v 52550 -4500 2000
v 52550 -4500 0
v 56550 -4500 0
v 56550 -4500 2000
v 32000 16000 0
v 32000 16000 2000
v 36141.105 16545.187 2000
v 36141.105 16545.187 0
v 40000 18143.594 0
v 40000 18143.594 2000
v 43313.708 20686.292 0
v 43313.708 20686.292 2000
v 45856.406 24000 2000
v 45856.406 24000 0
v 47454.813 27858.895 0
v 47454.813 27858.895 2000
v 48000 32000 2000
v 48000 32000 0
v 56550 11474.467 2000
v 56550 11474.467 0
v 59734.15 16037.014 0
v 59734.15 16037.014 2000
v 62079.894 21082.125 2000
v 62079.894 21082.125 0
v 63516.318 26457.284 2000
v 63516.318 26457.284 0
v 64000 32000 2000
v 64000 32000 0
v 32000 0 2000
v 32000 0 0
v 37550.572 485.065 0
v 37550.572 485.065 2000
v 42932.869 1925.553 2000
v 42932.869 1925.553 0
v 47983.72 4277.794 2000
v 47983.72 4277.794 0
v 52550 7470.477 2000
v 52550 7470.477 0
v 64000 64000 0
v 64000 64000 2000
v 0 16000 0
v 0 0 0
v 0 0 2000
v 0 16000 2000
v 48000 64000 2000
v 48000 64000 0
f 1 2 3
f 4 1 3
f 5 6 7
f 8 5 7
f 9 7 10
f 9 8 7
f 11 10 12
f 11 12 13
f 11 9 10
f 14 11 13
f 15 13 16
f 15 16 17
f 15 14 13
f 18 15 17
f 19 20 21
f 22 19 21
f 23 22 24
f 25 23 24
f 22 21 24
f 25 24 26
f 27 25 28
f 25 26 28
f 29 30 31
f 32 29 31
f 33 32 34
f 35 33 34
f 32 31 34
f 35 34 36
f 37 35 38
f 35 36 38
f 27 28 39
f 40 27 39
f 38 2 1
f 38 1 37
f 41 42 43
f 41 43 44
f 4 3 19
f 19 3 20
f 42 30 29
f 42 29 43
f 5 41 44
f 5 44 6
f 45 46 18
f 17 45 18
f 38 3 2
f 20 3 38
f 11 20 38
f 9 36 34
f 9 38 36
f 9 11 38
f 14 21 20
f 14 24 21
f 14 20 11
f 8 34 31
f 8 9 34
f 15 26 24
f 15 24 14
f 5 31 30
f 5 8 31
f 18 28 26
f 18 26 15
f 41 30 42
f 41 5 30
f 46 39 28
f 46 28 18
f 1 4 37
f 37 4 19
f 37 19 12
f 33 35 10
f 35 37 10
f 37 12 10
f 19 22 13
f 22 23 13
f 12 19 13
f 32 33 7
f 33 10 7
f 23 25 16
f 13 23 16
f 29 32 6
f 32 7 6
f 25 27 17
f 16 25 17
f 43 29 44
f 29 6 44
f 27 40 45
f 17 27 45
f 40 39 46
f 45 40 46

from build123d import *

# Parameters (mm, degrees)
PAD_DEPTH = 2000


with BuildPart() as part:
    # Sketch → Pad (new body)
    with BuildSketch(Plane.XY):
        with BuildLine():
            Line((0, 16000), (32000, 16000))
            ThreePointArc((32000, 16000), (43313.708499, 20686.291501), (48000, 32000))
            Line((48000, 64000), (48000, 32000))
            Line((64000, 64000), (48000, 64000))
            Line((64000, 32000), (64000, 64000))
            ThreePointArc((56550, 11474.46712), (62079.893617, 21082.124749), (64000, 32000))
            Line((56550, -4500), (56550, 11474.46712))
            Line((52550, -4500), (56550, -4500))
            Line((52550, -4500), (52550, 7470.476972))
            ThreePointArc((32000, 0), (42932.869319, 1925.552899), (52550, 7470.476972))
            Line((32000, 0), (0, 0))
            Line((0, 0), (0, 16000))
        make_face()
    extrude(amount=PAD_DEPTH)


solid = part.part
